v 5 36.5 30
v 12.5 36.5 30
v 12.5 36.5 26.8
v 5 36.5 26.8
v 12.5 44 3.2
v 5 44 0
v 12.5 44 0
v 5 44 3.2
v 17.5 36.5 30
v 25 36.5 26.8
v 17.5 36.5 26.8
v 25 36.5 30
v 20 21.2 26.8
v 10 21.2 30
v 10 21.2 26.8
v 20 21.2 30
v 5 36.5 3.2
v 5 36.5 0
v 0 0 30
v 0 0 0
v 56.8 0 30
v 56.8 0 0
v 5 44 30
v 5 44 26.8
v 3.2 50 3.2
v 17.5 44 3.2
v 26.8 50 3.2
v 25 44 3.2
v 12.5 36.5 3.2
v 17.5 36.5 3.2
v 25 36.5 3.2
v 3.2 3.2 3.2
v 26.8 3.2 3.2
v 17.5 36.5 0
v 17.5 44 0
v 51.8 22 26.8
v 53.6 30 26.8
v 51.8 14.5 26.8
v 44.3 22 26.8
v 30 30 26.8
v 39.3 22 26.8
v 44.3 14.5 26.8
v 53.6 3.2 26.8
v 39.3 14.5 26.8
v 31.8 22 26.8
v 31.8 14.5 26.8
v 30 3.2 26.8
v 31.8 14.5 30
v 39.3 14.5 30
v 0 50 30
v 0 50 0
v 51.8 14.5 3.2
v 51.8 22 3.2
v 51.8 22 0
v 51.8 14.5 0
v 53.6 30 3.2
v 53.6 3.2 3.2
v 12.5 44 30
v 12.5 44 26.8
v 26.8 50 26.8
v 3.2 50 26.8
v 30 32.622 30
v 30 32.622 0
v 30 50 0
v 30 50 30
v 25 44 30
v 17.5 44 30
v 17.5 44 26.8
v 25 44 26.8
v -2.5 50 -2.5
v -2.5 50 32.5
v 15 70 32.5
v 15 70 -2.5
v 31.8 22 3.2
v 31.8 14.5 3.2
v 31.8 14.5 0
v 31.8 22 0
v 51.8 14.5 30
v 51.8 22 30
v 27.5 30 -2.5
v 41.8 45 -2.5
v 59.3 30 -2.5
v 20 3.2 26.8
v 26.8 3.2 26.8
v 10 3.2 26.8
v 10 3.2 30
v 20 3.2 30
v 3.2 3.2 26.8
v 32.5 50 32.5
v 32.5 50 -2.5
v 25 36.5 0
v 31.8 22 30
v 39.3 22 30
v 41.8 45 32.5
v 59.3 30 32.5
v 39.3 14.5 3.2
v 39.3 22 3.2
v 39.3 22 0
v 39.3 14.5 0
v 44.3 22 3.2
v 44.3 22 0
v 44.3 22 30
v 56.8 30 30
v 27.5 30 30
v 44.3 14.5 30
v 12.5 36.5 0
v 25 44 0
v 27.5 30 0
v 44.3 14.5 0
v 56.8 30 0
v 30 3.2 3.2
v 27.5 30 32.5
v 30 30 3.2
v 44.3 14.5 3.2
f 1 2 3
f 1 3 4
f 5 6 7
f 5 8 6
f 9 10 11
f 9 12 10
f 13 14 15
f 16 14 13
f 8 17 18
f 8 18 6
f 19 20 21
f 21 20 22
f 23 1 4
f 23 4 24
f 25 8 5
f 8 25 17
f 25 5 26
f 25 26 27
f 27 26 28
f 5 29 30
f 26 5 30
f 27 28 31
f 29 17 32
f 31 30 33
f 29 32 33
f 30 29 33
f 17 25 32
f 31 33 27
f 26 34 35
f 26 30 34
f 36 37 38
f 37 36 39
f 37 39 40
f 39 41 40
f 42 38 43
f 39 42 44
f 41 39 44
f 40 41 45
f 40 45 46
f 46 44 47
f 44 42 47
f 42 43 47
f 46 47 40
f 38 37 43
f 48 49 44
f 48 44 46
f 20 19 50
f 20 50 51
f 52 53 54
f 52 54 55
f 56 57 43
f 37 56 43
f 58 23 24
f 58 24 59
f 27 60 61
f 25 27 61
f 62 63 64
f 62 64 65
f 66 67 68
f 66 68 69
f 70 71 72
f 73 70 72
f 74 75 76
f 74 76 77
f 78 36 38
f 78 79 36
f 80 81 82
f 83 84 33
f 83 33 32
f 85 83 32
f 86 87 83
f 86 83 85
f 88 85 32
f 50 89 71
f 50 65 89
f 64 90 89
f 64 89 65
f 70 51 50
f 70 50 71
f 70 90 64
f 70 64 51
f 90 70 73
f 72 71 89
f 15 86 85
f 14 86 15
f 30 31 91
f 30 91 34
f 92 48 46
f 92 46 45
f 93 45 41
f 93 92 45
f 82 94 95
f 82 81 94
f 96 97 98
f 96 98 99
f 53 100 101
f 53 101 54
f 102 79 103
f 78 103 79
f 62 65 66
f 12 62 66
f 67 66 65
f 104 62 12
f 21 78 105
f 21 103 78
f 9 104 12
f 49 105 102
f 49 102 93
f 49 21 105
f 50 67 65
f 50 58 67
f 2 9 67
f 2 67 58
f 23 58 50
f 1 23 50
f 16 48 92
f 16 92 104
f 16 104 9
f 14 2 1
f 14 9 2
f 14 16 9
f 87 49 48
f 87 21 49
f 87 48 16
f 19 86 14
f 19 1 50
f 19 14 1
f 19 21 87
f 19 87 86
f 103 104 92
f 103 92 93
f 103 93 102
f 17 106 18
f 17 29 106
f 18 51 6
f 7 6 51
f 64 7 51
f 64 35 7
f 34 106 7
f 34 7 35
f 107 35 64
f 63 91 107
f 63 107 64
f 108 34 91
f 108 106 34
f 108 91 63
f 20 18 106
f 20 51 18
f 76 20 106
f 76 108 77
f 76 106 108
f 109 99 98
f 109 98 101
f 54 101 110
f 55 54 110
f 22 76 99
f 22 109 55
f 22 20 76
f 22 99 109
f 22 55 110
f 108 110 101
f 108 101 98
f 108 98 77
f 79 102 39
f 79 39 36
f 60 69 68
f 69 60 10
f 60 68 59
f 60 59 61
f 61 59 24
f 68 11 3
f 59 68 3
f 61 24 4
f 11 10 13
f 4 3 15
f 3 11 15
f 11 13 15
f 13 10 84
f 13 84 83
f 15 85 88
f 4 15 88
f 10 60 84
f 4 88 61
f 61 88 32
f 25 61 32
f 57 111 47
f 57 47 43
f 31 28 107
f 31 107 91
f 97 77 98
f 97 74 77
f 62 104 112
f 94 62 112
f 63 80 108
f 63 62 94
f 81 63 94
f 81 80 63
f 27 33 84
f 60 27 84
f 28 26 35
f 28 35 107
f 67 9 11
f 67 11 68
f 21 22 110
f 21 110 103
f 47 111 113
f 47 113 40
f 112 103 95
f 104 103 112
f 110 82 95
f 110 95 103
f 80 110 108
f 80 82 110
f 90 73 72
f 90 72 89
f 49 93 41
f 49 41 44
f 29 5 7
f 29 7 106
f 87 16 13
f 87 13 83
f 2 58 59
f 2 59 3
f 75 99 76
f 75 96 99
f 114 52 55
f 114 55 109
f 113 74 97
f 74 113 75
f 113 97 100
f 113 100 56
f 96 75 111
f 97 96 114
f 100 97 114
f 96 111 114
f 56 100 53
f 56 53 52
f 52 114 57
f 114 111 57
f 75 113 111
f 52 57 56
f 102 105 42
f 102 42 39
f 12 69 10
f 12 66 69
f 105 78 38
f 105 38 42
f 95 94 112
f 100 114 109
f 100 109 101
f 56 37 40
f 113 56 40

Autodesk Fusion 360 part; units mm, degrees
sketch "Sketch1" plane through (0, 0, 0) normal (0, 1, 0) x (1, 0, 0)
  line L0 (0, 0) -> (30, 0)
  line L1 (30, 0) -> (30, -30)
  line L2 (30, -30) -> (0, -30)
  line L3 (0, -30) -> (0, 0)
  line L4 (3.2, -3.2) -> (26.8, -3.2)
  line L5 (26.8, -3.2) -> (26.8, -26.8)
  line L6 (26.8, -26.8) -> (3.2, -26.8)
  line L7 (3.2, -26.8) -> (3.2, -3.2)
  line L8 (30, 0) -> (56.8, 0)
  line L9 (56.8, 0) -> (56.8, -30)
  line L10 (56.8, -30) -> (30, -30)
  line L11 (30, -30) -> (30, 0)
  line L12 (30, -3.2) -> (53.6, -3.2)
  line L13 (53.6, -3.2) -> (53.6, -26.8)
  line L14 (53.6, -26.8) -> (30, -26.8)
  dimension "d7" = 30
  dimension "d8" = 30
  dimension "d9" = 3.2
  dimension "d10" = 3.2
  dimension "d11" = 3.2
  dimension "d12" = 3.2
  dimension "d13" = 26.8
  dimension "d14" = 30
  dimension "d15" = 3.2
  dimension "d16" = 3.2
  dimension "d17" = 3.2
extrude "Extrude1" add sketch "Sketch1" along normal blind 50 contours L0 L1 L2 L3 L11 makes body 1
extrude "Extrude2" add sketch "Sketch1" along normal blind 30 contours L1 L8 L9 L10 L11 L12 L13 L14 bodies 1
sketch "Sketch2" plane through (0, 0, 30) normal (0, 0, 1) x (1, 0, 0)
  line L0 (0, 0) -> (56.8, 0)
  line L1 (56.8, 0) -> (56.8, 30)
  line L2 (56.8, 30) -> (30, 30)
  line L3 (30, 30) -> (30, 50)
  line L4 (30, 50) -> (0, 50)
  line L5 (0, 50) -> (0, 0)
  line L6 (10, 21.2) -> (20, 21.2)
  line L7 (20, 21.2) -> (20, 3.2)
  line L8 (20, 3.2) -> (10, 3.2)
  line L9 (10, 3.2) -> (10, 21.2)
  line L10 (5, 44) -> (12.5, 44)
  line L11 (12.5, 44) -> (12.5, 36.5)
  line L12 (12.5, 36.5) -> (5, 36.5)
  line L13 (5, 36.5) -> (5, 44)
  line L14 (17.5, 44) -> (25, 44)
  line L15 (25, 44) -> (25, 36.5)
  line L16 (25, 36.5) -> (17.5, 36.5)
  line L17 (17.5, 36.5) -> (17.5, 44)
  line L18 (31.8, 22) -> (39.3, 22)
  line L19 (39.3, 22) -> (39.3, 14.5)
  line L20 (39.3, 14.5) -> (31.8, 14.5)
  line L21 (31.8, 14.5) -> (31.8, 22)
  line L22 (44.3, 22) -> (51.8, 22)
  line L23 (51.8, 22) -> (51.8, 14.5)
  line L24 (51.8, 14.5) -> (44.3, 14.5)
  line L25 (44.3, 14.5) -> (44.3, 22)
  line L26 (30, 0) -> (0, 0)
  line L27 (0, 50) -> (0, 50.5)
  line L28 (30, 50) -> (32.5, 50)
  line L29 (0, 50) -> (-2.5, 50)
  line L30 (-2.5, 50) -> (15, 70)
  line L31 (15, 70) -> (32.5, 50)
  line L32 (56.8, 30) -> (59.3, 30)
  line L33 (30, 30) -> (27.5, 30)
  line L34 (27.5, 30) -> (41.8, 45)
  line L35 (41.8, 45) -> (59.3, 30)
  dimension "d22" = 7.5
  dimension "d23" = 7.5
  dimension "d24" = 7.5
  dimension "d25" = 7.5
  dimension "d26" = 5
  dimension "d27" = 5
  dimension "d28" = 6
  dimension "d29" = 6
  dimension "d30" = 18
  dimension "d31" = 10
  dimension "d32" = 3.2
  dimension "d33" = 10
  dimension "d34" = 7.5
  dimension "d35" = 7.5
  dimension "d36" = 7.5
  dimension "d37" = 7.5
  dimension "d38" = 5
  dimension "d39" = 5
  dimension "d40" = 8
  dimension "d41" = 8
  dimension "d47" = 0.5
  dimension "d48" = 2.5
  dimension "d49" = 2.5
  dimension "d50" = 20
  dimension "d51" = 17.5
  dimension "d52" = 2.5
  dimension "d53" = 2.5
  dimension "d54" = 15
  dimension "d55" = 17.5
extrude "Extrude3" add sketch "Sketch1" along normal blind 3.2 contours L4 L5 L6 L7 bodies 1
extrude "Extrude4" add sketch "Sketch1" along normal blind 3.2 contours L1 L11 L12 L13 L14 bodies 1
extrude "Extrude5" add sketch "Sketch2" along normal blind 2.5 separate body contours L4 L28 L29 L30 L31 makes body 2
extrude "Extrude6" add sketch "Sketch2" along normal blind 2.5 separate body contours L2 L3 L32 L34 L35 makes body 3
extrude "Extrude7" add sketch "Sketch2" against normal blind 32.5 contours L4 L28 L29 L30 L31 bodies 1 2
extrude "Extrude8" add sketch "Sketch2" against normal blind 32.5 contours L2 L3 L32 L34 L35 bodies 1 3
extrude "Extrude9" add sketch "Sketch2" against normal blind 32.5 contours L3 L33 L34 bodies 1
extrude "Extrude10" add sketch "Sketch2" along normal blind 2.5 contours L3 L33 L34 bodies 1
extrude "Extrude11" cut sketch "Sketch2" against normal blind 3.2 contours L6 L7 L8 L9 bodies 1
extrude "Extrude12" cut sketch "Sketch2" against normal blind 30 contours L10 L11 L12 L13 | L14 L15 L16 L17 | L18 L19 L20 L21 | L22 L23 L24 L25 bodies 1
